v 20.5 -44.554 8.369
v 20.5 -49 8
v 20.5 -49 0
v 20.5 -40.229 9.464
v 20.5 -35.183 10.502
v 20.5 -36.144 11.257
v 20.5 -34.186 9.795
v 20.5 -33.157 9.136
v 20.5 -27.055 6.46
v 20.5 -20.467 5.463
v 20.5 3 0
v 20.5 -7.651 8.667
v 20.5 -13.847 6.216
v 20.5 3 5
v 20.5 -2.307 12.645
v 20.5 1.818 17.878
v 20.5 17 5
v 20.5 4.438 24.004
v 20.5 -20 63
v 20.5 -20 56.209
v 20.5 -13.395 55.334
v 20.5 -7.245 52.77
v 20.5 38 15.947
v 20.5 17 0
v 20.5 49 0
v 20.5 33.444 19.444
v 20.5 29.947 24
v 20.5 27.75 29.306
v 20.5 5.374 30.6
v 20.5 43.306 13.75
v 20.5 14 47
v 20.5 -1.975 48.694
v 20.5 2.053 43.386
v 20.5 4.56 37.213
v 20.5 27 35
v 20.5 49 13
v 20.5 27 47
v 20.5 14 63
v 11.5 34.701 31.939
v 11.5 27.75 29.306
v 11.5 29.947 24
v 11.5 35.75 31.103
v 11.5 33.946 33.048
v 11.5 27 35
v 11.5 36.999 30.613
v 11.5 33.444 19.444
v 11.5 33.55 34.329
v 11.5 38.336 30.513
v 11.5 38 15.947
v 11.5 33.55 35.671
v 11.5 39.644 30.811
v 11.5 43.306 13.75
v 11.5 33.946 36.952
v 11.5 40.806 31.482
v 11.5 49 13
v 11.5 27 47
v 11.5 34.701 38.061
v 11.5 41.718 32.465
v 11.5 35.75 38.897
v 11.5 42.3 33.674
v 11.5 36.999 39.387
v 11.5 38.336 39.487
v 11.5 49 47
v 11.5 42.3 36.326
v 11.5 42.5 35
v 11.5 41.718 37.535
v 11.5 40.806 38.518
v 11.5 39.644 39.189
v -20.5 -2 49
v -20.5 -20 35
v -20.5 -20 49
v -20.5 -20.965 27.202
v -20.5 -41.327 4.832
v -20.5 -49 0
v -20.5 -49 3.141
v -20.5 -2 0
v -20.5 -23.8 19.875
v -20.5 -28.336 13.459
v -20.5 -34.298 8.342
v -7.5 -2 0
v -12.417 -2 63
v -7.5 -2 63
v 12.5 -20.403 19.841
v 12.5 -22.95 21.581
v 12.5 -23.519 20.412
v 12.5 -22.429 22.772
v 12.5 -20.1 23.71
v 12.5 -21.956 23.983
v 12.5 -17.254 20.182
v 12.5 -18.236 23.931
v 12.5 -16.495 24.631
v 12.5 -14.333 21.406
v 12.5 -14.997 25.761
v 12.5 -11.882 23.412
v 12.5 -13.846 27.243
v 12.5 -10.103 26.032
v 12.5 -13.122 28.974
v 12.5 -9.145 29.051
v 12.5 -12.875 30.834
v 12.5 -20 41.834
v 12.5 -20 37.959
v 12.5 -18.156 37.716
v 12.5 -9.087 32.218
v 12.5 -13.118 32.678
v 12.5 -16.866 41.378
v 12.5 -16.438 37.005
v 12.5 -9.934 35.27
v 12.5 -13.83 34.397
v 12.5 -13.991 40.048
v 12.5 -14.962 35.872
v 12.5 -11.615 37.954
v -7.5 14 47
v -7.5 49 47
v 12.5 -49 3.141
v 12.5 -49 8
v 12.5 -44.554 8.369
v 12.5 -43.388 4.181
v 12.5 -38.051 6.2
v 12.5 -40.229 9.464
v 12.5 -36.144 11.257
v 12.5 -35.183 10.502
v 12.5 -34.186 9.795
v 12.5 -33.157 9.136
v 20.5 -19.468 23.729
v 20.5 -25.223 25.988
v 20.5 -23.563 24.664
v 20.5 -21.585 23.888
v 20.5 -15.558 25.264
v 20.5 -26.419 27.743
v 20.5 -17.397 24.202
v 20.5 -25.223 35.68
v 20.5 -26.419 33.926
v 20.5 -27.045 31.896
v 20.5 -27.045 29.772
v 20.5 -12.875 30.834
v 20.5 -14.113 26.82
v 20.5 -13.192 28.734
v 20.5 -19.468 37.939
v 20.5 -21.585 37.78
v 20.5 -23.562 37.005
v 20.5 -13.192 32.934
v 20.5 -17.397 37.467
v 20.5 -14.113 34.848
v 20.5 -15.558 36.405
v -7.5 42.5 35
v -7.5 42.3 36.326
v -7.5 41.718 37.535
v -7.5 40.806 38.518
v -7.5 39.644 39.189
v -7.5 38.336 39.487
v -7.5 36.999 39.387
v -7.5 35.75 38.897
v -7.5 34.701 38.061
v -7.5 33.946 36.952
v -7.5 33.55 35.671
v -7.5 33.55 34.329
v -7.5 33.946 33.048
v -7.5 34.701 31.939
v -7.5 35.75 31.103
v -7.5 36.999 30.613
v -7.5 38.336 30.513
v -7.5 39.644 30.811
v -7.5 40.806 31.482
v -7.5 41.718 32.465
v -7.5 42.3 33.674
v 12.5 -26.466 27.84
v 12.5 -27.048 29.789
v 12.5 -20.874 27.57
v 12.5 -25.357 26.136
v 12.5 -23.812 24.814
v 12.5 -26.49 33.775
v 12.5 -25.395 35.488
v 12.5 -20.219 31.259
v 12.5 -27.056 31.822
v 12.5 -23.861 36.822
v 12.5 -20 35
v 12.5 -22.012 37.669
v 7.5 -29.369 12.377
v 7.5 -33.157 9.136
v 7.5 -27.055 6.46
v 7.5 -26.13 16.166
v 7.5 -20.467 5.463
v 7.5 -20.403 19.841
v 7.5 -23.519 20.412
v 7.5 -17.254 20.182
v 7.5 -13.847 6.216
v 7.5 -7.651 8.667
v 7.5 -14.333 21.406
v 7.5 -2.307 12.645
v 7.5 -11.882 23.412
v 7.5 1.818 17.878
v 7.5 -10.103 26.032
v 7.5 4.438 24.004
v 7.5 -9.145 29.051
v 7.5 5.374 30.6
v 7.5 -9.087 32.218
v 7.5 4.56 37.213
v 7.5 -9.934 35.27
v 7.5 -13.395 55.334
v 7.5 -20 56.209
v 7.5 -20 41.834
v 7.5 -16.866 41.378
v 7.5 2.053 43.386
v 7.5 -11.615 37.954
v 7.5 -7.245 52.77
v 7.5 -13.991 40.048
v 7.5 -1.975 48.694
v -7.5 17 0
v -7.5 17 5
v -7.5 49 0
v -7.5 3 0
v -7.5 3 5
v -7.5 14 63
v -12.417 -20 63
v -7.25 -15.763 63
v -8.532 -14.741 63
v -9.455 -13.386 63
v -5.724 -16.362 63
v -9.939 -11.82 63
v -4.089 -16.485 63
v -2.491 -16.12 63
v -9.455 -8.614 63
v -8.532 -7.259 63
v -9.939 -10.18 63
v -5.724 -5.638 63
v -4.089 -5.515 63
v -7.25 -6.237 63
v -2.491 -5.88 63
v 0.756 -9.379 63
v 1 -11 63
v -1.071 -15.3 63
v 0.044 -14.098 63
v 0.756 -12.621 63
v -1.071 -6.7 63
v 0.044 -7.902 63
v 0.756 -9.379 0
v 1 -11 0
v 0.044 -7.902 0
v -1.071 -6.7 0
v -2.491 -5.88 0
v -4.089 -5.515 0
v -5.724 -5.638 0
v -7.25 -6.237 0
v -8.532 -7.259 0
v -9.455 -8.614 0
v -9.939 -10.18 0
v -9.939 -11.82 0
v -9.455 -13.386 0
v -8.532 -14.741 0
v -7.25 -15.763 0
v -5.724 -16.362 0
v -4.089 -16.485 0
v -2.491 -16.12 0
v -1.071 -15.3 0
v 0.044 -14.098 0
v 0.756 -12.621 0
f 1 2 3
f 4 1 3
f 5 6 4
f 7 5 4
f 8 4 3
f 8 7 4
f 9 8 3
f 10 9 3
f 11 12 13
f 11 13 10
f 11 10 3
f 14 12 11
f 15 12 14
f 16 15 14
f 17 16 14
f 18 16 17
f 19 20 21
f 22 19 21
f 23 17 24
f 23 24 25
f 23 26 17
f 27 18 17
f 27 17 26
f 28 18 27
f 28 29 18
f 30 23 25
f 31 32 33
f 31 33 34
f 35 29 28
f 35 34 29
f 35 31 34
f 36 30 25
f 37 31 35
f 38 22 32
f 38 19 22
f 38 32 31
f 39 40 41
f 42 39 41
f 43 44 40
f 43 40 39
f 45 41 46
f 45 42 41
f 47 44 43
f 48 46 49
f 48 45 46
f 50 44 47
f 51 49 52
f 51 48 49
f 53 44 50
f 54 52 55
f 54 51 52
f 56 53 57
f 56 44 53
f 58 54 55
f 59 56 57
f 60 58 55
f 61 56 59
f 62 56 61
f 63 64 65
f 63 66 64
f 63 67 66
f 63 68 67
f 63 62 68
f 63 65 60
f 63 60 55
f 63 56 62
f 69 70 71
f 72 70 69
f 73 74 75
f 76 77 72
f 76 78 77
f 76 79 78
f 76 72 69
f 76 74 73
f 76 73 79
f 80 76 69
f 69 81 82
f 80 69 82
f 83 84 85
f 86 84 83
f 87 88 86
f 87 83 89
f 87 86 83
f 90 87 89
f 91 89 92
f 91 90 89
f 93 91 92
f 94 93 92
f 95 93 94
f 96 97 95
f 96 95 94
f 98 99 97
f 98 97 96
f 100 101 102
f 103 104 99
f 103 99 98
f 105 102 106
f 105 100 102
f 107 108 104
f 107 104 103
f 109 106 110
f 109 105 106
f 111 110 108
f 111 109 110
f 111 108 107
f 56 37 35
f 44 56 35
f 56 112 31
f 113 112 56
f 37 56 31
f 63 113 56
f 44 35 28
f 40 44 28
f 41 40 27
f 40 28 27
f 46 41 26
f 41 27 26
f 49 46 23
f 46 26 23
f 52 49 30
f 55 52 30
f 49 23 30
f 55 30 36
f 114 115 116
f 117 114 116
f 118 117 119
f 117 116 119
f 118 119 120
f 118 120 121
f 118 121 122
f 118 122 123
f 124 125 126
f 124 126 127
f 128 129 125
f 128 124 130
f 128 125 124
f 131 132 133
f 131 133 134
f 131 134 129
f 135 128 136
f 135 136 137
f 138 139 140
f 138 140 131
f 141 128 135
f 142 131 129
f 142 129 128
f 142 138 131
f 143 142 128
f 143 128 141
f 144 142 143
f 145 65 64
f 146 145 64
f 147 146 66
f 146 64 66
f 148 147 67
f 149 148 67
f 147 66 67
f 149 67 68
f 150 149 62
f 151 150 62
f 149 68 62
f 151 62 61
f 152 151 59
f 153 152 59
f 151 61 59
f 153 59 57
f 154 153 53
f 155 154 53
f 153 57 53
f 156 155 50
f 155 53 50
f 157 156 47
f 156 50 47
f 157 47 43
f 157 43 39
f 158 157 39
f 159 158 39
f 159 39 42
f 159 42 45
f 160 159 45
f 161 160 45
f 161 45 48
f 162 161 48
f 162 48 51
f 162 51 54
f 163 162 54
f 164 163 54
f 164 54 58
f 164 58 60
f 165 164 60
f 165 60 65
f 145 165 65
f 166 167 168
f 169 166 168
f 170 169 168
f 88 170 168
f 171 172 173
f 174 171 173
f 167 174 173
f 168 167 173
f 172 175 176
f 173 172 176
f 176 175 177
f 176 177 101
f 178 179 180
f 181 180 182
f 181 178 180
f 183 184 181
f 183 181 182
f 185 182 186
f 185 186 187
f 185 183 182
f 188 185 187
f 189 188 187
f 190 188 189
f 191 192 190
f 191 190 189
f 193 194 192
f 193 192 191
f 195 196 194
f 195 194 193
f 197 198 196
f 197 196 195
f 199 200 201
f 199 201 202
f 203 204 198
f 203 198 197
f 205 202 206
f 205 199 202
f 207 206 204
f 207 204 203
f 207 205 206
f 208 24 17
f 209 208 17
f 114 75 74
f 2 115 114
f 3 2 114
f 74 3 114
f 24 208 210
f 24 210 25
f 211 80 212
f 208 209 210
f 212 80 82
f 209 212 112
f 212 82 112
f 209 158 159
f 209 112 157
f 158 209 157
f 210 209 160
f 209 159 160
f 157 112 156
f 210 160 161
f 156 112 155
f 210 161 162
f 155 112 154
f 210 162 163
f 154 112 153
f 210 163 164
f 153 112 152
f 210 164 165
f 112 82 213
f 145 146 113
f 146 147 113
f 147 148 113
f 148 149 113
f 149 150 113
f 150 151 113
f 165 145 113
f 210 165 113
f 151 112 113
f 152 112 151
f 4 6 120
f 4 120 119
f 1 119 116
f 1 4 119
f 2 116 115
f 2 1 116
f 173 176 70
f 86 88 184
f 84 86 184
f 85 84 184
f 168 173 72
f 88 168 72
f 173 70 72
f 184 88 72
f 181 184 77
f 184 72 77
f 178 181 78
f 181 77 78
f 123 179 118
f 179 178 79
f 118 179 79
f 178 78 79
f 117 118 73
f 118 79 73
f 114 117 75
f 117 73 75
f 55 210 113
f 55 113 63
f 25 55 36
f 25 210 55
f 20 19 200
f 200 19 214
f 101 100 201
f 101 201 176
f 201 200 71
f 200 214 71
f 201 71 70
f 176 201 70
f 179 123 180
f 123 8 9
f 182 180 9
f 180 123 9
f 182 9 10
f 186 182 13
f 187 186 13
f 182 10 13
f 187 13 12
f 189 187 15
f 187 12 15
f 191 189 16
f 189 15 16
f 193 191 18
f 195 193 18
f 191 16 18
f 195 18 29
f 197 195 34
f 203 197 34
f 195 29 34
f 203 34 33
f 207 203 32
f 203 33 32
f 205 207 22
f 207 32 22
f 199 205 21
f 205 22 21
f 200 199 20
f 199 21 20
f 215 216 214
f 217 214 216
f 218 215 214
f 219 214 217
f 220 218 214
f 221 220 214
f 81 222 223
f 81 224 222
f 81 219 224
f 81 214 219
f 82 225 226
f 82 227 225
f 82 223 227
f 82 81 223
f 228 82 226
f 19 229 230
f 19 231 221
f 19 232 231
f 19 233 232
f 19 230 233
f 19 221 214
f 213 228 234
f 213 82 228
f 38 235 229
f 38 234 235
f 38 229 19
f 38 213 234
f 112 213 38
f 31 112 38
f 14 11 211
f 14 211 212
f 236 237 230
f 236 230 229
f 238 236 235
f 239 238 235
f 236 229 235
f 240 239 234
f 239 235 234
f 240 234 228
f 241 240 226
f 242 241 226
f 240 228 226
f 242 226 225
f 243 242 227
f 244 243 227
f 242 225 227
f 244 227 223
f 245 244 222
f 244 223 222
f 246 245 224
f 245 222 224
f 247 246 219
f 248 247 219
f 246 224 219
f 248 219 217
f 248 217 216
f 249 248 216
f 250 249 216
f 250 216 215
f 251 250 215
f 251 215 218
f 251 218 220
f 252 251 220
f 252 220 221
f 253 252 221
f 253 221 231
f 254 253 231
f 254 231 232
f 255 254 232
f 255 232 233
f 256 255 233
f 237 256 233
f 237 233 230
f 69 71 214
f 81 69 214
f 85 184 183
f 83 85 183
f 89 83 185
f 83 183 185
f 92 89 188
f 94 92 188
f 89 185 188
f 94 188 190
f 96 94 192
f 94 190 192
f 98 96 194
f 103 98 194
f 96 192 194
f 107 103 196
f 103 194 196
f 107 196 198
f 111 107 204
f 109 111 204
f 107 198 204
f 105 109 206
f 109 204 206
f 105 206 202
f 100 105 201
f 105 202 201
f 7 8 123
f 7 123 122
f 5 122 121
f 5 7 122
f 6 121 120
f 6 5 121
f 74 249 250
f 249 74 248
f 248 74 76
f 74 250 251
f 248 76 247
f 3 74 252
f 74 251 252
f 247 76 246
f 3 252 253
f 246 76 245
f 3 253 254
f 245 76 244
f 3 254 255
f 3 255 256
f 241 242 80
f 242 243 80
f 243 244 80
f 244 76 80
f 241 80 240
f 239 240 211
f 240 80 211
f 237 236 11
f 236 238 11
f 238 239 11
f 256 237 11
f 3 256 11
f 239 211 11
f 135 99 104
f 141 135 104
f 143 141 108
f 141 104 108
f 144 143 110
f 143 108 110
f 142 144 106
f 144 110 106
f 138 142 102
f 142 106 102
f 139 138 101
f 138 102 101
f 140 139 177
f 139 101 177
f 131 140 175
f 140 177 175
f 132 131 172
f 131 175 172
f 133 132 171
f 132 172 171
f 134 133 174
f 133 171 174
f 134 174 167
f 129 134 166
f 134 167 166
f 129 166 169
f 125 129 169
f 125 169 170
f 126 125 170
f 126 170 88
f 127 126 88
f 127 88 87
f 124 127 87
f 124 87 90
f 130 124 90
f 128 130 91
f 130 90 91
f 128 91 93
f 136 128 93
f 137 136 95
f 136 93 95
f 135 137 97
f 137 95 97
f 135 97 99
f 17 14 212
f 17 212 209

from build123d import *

# Parameters (mm, degrees)
F0_W      = 41
F0_H      = 98
F1_DEPTH  = 63
F3_DEPTH  = 9
F5_DEPTH  = 16
F7_DEPTH  = 98.001
F9_W      = 13
F9_H      = 51
F10_DEPTH = 63.001
F11_R     = 25.375
F12_DEPTH = 13
F13_R     = 11
F14_DEPTH = 5
F18_DEPTH = 41.001
F15_R     = 7.125
F19_DEPTH = 8
F22_DEPTH = 8
F23_W     = 14
F23_H     = 5
F24_DEPTH = 41.001
F25_R     = 4.5
F26_DEPTH = 32.001
F27_R     = 5.5
F28_DEPTH = 63.001


with BuildPart() as f1:
    # F0 (on Top) → F1 (new body)
    with BuildSketch(Plane.XY):
        Rectangle(F0_W, F0_H)
    extrude(amount=F1_DEPTH)

    # F2 (on face) → F3 (cut)
    with BuildSketch(Plane.YZ.offset(20.5)):
        with BuildLine():
            Line((27, 63), (27, 35))
            ThreePointArc((27, 35), (33.4436508139, 19.4436508139), (49, 13))
            Line((49, 13), (49, 63))
            Line((49, 63), (27, 63))
        make_face()
    extrude(amount=-F3_DEPTH, mode=Mode.SUBTRACT)

    # F4 (on face) → F5 (cut)
    with BuildSketch(Plane.XY.offset(63)):
        Polygon((11.5, 49), (-20.5, 49), (-20.5, 14), (20.5, 14), (20.5, 27), (11.5, 27), align=None)
    extrude(amount=-F5_DEPTH, mode=Mode.SUBTRACT)

    # F6 (on face) → F7 (cut, through all)
    with BuildSketch(Plane.XZ.offset(49)):
        Polygon((-20.5, 63), (-20.5, 49), (-12.4170962313, 63), align=None)
    extrude(amount=-F7_DEPTH, mode=Mode.SUBTRACT)

    # F9 (on offset) → F10 (cut, through all)
    with BuildSketch(Plane.XY.offset(63)):
        with Locations((-14, 23.5)):
            Rectangle(F9_W, F9_H)
    extrude(amount=-F10_DEPTH, mode=Mode.SUBTRACT)

    # F11 (on face) → F12 (cut)
    with BuildSketch(Plane.YZ.offset(20.5)):
        with Locations((-20, 30.8340992779)):
            Circle(F11_R)
    extrude(amount=-F12_DEPTH, mode=Mode.SUBTRACT)

    # F13 (on face) → F14 (join)
    with BuildSketch(Plane.YZ.offset(7.5)):
        with Locations((-20, 30.8340992779)):
            Circle(F13_R)
    extrude(amount=F14_DEPTH)

    # F17 (on offset) → F18 (cut, through all)
    with BuildSketch(Plane(origin=(-20.5, 0, 0), x_dir=(0, -1, 0), z_dir=(-1, 0, 0))):
        with BuildLine():
            Line((20, 63), (20, 35))
            ThreePointArc((20, 35), (68.2520480507, 7.4342434503), (67.4919333848, 63))
            Line((67.4919333848, 63), (20, 63))
        make_face()
    extrude(amount=-F18_DEPTH, mode=Mode.SUBTRACT)

    # F15 (on face) → F19 (join)
    with BuildSketch(Plane.YZ.offset(12.5)):
        with Locations((-20, 30.8340992779)):
            Circle(F15_R)
    extrude(amount=F19_DEPTH)

    # F21 (on offset) → F22 (join)
    with BuildSketch(Plane.YZ.offset(20.5)):
        with BuildLine():
            ThreePointArc((-36.1440872593, 11.2570956367), (-42.3689524888, 8.8269373419), (-49, 8))
            Line((-49, 8), (-49, 0))
            Line((-49, 0), (-33.1566682197, 0))
            Line((-33.1566682197, 0), (-33.1566682197, 9.1363411827))
            ThreePointArc((-33.1566682197, 9.1363411827), (-34.6887020452, 10.1427325461), (-36.1440872593, 11.2570956367))
        make_face()
    extrude(amount=-F22_DEPTH)

    # F23 (on face) → F24 (cut, through all)
    with BuildSketch(Plane.YZ.offset(20.5)):
        with Locations((10, 2.5)):
            Rectangle(F23_W, F23_H)
    extrude(amount=-F24_DEPTH, mode=Mode.SUBTRACT)

    # F25 (on face) → F26 (cut, through all)
    with BuildSketch(Plane.YZ.offset(11.5)):
        with Locations((38, 35)):
            Circle(F25_R)
    extrude(amount=-F26_DEPTH, mode=Mode.SUBTRACT)

    # F27 (on face) → F28 (cut, through all)
    with BuildSketch(Plane.XY.offset(63)):
        with Locations((-4.5, -11)):
            Circle(F27_R)
    extrude(amount=-F28_DEPTH, mode=Mode.SUBTRACT)


solid = f1.part
